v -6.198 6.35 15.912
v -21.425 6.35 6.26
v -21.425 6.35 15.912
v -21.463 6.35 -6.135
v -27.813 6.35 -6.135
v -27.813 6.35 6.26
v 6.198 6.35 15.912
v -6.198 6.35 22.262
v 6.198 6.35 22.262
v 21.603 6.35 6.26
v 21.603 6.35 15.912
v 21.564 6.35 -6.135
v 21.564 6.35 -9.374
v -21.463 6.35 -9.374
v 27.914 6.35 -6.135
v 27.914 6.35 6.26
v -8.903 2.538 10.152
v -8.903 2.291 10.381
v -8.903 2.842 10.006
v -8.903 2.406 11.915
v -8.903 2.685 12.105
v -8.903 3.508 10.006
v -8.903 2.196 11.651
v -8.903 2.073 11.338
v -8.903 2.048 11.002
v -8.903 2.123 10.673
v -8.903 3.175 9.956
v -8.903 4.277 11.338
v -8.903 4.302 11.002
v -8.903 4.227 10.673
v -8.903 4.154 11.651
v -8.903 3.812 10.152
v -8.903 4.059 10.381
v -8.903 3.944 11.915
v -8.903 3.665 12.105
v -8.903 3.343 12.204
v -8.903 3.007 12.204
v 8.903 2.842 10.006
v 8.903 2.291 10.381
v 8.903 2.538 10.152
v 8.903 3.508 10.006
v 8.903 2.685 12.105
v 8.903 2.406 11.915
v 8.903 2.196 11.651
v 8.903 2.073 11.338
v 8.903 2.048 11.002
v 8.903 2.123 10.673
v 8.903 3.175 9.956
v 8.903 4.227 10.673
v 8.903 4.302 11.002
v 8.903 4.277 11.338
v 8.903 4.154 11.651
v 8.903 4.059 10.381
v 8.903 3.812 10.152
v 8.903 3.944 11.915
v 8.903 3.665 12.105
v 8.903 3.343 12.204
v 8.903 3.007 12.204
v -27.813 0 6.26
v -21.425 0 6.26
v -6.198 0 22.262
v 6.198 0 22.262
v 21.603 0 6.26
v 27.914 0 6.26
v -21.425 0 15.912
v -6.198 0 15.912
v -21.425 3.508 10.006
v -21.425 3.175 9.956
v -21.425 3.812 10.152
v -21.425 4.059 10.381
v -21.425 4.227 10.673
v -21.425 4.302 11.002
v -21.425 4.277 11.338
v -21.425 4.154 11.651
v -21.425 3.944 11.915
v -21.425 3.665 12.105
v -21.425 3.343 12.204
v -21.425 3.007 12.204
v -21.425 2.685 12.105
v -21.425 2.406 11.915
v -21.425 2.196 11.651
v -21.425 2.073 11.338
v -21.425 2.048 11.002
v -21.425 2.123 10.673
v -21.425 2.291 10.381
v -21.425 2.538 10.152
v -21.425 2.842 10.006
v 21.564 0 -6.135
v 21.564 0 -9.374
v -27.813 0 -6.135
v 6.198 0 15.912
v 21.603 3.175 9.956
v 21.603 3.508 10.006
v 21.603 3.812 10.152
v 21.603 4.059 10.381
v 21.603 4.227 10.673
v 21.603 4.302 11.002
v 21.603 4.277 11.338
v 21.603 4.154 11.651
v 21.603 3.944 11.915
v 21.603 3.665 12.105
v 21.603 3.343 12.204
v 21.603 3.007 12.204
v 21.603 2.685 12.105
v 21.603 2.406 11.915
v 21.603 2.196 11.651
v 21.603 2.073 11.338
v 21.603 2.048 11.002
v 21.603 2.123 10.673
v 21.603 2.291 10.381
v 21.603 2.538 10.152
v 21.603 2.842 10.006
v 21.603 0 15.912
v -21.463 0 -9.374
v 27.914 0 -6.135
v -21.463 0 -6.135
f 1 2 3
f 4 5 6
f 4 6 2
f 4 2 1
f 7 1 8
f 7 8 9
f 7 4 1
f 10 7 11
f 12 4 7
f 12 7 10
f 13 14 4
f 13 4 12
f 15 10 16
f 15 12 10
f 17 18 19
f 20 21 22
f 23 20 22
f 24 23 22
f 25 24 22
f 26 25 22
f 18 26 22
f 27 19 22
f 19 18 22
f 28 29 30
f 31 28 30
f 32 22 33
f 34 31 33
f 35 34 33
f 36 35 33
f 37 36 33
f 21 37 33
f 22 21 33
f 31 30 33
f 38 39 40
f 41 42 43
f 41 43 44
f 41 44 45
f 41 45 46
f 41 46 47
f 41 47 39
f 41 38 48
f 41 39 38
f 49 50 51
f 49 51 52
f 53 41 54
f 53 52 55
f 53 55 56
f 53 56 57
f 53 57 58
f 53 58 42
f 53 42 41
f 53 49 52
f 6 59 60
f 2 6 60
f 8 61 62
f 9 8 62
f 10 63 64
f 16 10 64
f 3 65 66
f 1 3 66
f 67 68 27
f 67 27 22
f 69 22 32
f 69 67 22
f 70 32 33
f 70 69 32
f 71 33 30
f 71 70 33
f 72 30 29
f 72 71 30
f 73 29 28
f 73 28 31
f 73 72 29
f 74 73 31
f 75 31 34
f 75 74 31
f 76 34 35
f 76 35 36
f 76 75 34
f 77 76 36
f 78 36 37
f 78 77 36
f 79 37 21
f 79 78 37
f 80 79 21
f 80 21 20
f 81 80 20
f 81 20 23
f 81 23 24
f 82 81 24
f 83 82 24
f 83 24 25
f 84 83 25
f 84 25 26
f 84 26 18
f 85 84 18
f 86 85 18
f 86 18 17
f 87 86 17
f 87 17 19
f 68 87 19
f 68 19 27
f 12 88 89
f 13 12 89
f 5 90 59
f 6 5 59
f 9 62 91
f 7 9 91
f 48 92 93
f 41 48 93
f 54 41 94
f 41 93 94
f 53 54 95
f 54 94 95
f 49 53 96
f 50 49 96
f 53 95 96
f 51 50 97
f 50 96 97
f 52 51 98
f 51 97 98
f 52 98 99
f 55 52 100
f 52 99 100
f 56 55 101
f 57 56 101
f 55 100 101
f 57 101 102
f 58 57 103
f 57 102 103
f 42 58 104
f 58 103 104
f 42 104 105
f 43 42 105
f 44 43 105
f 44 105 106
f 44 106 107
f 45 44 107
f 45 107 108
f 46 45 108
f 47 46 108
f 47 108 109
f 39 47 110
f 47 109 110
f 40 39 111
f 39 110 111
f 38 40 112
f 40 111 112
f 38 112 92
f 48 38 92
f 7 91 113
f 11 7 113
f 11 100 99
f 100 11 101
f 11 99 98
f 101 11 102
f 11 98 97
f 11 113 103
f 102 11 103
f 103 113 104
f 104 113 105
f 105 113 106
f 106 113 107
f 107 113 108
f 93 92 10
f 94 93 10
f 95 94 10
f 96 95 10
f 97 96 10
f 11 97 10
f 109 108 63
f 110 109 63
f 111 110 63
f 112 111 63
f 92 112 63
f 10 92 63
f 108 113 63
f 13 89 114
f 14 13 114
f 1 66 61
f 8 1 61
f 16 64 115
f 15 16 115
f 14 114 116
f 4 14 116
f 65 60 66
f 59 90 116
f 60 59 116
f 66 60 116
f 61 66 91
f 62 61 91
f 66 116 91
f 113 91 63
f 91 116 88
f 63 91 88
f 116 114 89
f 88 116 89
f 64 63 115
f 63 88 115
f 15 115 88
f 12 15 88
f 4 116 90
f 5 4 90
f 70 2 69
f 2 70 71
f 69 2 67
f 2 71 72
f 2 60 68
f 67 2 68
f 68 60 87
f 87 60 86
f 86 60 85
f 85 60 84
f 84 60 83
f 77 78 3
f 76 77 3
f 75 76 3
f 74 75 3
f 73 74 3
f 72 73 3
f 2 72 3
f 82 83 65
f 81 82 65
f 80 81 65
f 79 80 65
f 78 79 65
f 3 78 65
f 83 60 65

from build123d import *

# Parameters (mm, degrees)
BOSS_EXTRUDE1_DEPTH = 6.35
SKETCH3_R           = 1.1303
CUT_EXTRUDE1_DEPTH  = 12.7


with BuildPart() as part:
    # Sketch2 → Boss-Extrude1 (new body)
    with BuildSketch(Plane(origin=(0, 0, 0), x_dir=(1, 0, 0), z_dir=(0, 1, 0))):
        Polygon((-21.4249, -15.91216588), (-6.1976, -15.91216588), (-6.1976, -22.26216588), (6.1976, -22.26216588), (6.1976, -15.91216588), (21.6027, -15.91216588), (21.6027, -6.26016588), (27.914167201, -6.26016588), (27.914167201, 6.13503412), (21.564167201, 6.13503412), (21.564167201, 9.37353412), (-21.463432799, 9.37353412), (-21.463432799, 6.13503412), (-27.813432799, 6.13503412), (-27.813432799, -6.26016588), (-21.4249, -6.26016588), align=None)
    extrude(amount=BOSS_EXTRUDE1_DEPTH)

    # Sketch3 → Cut-Extrude1 (cut)
    with BuildSketch(Plane(origin=(21.6027, 0, 0), x_dir=(0, 0, -1), z_dir=(1, 0, 0))):
        with Locations((-11.08616588, 3.175)):
            Circle(SKETCH3_R)
    cut_extrude1 = extrude(amount=-CUT_EXTRUDE1_DEPTH, mode=Mode.SUBTRACT)

    # Mirror1: Cut-Extrude1 across plane
    add(cut_extrude1.mirror(Plane(origin=(0, 0, 0), x_dir=(0, 0, 1), z_dir=(1, 0, 0))), mode=Mode.SUBTRACT)


solid = part.part
